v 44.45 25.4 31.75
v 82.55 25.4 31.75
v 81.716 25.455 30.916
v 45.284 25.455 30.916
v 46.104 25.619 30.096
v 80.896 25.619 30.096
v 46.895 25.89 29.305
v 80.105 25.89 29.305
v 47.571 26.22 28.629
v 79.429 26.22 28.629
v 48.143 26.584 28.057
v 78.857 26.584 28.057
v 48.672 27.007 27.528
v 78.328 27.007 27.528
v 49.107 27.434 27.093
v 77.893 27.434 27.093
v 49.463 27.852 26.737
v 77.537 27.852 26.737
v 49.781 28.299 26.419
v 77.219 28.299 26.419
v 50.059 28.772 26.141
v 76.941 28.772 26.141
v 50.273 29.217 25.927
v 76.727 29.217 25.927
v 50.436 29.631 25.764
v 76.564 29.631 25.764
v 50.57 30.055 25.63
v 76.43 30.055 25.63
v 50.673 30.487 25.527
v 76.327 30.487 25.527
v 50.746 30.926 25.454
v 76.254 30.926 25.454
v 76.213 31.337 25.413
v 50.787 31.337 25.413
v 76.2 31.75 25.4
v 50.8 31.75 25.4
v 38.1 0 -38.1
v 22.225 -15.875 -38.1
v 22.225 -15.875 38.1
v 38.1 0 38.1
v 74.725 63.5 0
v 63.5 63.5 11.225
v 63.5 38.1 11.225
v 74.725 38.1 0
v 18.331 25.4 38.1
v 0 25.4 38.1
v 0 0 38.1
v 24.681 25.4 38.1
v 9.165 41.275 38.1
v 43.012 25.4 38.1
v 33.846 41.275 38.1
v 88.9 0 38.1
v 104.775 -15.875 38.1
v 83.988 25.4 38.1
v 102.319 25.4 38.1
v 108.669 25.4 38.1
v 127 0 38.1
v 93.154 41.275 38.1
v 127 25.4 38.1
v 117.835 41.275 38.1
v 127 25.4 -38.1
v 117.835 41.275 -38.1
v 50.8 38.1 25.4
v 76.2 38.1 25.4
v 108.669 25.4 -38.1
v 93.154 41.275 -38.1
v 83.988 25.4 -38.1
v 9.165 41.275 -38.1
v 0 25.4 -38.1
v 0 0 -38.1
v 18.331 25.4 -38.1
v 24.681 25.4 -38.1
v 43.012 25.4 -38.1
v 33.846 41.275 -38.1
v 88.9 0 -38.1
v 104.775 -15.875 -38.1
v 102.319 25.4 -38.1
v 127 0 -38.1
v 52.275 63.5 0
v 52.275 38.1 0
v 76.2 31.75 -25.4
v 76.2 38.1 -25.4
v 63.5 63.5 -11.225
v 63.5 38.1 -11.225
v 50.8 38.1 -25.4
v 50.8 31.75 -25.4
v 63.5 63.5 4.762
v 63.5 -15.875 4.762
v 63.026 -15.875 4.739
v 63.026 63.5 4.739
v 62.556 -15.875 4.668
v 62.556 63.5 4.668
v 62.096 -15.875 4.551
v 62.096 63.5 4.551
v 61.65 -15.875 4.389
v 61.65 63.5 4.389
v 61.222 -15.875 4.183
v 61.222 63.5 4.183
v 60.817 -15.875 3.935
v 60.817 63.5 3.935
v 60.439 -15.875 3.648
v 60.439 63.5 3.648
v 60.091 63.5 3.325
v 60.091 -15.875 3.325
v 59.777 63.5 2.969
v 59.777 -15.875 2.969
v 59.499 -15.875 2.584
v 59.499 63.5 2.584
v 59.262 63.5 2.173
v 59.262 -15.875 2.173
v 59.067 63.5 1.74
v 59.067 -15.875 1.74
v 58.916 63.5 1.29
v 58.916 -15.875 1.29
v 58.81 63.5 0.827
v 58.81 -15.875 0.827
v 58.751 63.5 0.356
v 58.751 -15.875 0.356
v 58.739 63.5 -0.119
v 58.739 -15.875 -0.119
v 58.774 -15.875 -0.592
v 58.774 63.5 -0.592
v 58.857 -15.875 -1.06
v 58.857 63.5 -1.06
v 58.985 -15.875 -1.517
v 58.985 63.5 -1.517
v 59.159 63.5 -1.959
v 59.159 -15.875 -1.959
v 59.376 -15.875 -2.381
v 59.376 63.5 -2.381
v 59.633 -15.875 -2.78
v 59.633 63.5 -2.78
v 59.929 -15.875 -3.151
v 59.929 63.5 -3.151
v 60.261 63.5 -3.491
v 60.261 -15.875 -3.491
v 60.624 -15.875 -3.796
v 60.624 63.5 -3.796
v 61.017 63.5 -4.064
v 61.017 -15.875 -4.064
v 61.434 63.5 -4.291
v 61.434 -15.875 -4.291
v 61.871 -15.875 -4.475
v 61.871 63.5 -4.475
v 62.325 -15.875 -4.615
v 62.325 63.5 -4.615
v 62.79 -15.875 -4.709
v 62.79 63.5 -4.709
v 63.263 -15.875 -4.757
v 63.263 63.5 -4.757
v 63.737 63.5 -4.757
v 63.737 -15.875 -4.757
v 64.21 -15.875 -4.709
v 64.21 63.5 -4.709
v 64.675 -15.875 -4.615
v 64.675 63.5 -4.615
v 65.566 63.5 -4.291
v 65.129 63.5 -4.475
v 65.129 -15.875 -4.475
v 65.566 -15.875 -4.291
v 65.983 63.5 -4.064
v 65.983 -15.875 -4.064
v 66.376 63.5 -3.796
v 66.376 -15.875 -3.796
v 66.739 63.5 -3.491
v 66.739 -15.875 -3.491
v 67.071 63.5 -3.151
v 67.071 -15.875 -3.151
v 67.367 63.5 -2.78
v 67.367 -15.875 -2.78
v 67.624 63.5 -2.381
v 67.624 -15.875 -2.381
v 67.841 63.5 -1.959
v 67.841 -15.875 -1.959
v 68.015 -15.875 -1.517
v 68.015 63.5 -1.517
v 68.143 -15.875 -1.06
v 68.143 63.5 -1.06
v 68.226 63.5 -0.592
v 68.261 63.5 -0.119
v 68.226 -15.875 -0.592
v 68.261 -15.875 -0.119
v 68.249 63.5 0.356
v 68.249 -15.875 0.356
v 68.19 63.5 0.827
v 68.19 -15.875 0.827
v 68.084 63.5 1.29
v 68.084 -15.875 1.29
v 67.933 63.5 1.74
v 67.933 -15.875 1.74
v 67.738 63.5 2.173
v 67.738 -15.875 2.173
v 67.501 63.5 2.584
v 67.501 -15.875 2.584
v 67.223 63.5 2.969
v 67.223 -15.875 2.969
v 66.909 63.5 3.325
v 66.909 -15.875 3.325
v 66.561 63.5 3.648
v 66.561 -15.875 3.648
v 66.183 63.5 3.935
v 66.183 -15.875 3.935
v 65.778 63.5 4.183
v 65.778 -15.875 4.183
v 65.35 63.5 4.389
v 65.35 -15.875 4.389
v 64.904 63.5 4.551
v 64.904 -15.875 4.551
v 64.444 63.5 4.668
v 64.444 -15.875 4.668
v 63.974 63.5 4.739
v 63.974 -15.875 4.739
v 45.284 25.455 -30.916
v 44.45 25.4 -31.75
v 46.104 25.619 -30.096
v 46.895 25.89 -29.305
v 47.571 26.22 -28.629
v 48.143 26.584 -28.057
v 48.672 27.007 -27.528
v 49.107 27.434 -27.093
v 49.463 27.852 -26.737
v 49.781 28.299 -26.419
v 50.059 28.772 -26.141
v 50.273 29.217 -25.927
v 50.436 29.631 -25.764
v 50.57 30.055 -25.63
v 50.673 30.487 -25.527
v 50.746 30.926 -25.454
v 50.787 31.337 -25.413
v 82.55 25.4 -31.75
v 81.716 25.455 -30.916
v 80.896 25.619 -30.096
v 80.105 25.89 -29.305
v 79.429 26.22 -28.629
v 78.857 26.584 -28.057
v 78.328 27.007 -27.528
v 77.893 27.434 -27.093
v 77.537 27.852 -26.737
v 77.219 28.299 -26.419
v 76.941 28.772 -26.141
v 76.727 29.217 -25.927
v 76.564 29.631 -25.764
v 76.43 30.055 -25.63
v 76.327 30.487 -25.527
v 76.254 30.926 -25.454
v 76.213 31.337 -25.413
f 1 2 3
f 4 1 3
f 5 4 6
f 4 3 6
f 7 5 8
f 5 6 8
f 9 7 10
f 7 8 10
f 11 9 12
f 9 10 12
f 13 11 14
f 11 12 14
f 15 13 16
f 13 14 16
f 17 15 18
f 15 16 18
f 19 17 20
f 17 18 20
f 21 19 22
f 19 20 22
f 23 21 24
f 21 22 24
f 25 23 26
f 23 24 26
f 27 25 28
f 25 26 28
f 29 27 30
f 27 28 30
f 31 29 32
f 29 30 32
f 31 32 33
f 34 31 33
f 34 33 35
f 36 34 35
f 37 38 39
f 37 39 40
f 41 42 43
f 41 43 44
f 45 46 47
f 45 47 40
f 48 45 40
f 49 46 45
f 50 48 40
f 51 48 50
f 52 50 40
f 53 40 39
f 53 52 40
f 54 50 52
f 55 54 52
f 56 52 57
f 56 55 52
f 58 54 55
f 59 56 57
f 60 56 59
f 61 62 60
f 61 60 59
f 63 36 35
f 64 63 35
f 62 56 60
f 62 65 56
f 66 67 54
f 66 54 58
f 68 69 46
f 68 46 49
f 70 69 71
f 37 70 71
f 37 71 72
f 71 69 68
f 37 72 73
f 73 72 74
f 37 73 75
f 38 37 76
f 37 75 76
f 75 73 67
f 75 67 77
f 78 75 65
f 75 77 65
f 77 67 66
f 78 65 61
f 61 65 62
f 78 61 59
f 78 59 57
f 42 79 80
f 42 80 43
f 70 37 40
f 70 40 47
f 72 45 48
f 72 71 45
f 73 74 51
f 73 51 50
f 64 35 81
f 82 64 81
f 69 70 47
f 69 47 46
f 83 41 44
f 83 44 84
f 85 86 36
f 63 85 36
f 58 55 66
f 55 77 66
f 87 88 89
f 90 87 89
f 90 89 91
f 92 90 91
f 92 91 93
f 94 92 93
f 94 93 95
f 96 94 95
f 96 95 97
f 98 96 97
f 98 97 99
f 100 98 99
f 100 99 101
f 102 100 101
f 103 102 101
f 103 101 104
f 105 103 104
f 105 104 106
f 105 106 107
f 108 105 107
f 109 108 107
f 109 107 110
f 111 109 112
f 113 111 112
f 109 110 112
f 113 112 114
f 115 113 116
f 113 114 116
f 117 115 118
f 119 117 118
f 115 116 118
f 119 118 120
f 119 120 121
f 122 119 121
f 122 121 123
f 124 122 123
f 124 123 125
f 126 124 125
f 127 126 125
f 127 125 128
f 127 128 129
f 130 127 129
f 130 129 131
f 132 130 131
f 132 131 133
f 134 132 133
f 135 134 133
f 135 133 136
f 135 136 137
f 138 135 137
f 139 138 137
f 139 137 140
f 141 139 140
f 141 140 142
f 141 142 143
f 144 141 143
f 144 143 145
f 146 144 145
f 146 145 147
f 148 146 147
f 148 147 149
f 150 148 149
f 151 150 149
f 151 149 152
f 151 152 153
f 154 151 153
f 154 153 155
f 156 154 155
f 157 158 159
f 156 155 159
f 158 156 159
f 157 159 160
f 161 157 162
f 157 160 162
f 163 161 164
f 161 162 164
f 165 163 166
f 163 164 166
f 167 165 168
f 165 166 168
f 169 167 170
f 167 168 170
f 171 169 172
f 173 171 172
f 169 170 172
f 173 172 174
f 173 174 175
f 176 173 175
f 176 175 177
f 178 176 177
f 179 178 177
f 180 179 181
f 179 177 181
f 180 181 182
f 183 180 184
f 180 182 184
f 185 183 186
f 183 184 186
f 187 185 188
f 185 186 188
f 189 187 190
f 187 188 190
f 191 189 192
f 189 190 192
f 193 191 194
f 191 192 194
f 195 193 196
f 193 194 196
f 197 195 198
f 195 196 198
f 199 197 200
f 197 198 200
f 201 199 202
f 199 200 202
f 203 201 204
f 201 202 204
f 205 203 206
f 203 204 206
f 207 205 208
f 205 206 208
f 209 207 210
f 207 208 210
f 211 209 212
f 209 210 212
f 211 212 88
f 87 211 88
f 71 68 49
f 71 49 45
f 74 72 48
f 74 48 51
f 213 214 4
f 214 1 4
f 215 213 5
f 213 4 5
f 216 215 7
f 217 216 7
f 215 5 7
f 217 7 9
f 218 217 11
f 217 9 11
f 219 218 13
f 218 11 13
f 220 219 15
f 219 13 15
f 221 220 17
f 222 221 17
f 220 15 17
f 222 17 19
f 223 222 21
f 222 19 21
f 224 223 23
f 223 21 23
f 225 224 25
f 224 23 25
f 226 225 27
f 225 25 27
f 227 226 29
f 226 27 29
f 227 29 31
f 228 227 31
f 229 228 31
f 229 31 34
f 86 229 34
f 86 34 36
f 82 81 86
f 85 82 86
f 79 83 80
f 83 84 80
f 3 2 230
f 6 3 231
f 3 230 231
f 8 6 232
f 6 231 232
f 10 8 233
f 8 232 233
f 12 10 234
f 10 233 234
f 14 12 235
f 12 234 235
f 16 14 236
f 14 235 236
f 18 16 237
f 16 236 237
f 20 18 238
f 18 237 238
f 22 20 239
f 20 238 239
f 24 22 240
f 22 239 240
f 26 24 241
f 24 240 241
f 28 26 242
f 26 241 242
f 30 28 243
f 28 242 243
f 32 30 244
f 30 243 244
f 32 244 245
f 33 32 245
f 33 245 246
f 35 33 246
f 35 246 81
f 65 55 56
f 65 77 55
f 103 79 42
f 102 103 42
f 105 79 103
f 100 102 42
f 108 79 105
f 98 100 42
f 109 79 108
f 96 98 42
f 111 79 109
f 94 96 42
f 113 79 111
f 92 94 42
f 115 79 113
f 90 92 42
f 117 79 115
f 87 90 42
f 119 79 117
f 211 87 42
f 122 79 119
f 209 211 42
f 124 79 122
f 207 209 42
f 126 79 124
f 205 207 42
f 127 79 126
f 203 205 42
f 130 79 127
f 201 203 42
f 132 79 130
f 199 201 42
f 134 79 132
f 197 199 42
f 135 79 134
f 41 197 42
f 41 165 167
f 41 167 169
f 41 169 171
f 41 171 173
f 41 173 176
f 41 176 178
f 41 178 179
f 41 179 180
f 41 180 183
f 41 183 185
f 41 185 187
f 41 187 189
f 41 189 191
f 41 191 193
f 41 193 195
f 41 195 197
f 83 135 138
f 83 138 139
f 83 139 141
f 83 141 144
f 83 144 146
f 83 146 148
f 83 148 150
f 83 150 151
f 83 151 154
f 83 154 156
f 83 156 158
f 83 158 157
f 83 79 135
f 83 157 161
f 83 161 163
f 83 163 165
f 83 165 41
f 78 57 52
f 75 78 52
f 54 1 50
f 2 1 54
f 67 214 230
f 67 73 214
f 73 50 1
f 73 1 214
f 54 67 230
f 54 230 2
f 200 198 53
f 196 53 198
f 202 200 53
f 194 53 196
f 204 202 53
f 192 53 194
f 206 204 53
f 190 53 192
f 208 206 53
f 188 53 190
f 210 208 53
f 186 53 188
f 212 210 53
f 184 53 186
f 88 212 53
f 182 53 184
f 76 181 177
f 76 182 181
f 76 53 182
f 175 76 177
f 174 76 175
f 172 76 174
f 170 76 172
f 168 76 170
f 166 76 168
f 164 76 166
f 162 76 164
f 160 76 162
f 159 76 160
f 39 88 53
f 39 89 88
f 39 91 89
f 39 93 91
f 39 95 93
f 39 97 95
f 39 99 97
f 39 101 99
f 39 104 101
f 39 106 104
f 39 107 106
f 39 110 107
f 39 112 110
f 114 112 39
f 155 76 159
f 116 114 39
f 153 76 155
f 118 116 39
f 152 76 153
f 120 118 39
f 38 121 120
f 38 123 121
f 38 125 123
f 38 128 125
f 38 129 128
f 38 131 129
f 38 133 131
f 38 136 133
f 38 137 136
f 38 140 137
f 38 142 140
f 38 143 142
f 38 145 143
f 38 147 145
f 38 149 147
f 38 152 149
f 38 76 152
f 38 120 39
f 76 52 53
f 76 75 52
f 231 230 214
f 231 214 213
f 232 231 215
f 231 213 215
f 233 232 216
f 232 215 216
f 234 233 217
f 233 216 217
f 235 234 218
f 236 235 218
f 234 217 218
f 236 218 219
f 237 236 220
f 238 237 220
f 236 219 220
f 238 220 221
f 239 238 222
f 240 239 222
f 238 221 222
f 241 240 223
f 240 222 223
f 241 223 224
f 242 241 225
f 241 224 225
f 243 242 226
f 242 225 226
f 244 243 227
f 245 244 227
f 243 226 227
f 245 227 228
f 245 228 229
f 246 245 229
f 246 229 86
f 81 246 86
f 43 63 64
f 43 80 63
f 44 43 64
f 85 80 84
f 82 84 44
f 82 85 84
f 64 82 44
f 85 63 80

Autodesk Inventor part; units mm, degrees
ref_plane "YZ Plane" through (0, 0, 0) normal (1, 0, 0) x (0, 1, 0)
ref_plane "XZ Plane" through (0, 0, 0) normal (0, 1, 0) x (-1, 0, 0)
ref_plane "XY Plane" through (0, 0, 0) normal (0, 0, 1) x (1, 0, 0)
sketch "Sketch1" plane through (0, 0, 0) normal (0, 0, 1) x (1, 0, 0)
  line L0 (0, 0) -> (0, 25.4)
  line L1 (0, 25.4) -> (9.1654, 41.275)
  line L2 (9.1654, 41.275) -> (18.3309, 25.4)
  line L3 (18.3309, 25.4) -> (24.6809, 25.4)
  line L4 (24.6809, 25.4) -> (33.8463, 41.275)
  line L5 (33.8463, 41.275) -> (43.0117, 25.4)
  line L6 (43.0117, 25.4) -> (83.9883, 25.4)
  line L7 (102.3191, 25.4) -> (108.6691, 25.4)
  line L8 (108.6691, 25.4) -> (117.8346, 41.275)
  line L9 (117.8346, 41.275) -> (127, 25.4)
  line L10 (127, 25.4) -> (127, 0)
  line L11 (127, 0) -> (88.9, 0)
  line L12 (88.9, 0) -> (104.775, -15.875)
  line L13 (104.775, -15.875) -> (22.225, -15.875)
  line L14 (22.225, -15.875) -> (38.1, 0)
  line L15 (38.1, 0) -> (0, 0)
  line L16 (9.1654, 41.275) -> (117.8346, 41.275) construction
  line L17 (102.3191, 25.4) -> (93.1537, 41.275)
  line L18 (83.9883, 25.4) -> (93.1537, 41.275)
  dimension "d0" = 45
  dimension "d1" = 45
  dimension "d2" = 127
  dimension "d3" = 60
  dimension "d4" = 6.35
  dimension "d5" = 25.4
  dimension "d6" = 25.4
  dimension "d7" = 38.1
  dimension "d8" = 15.875
  dimension "d9" = 6.35
  dimension "d10" = 60
  dimension "d12" = 60
  dimension "d13" = 25.4
  dimension "d14" = 25.4
  dimension "d15" = 25.4
  dimension "d16" = 15.875
  dimension "d17" = 60
extrude "MAIN BODY" add sketch "Sketch1" along normal mid plane 76.2
sketch "Sketch2" plane through (43.0117, 25.4, 38.1) normal (0, 1, 0) x (1, 0, 0)
  line L0 (7.7883, 12.7) -> (33.1883, 12.7)
  line L1 (33.1883, 12.7) -> (33.1883, 63.5)
  line L2 (33.1883, 63.5) -> (7.7883, 63.5)
  line L3 (7.7883, 63.5) -> (7.7883, 12.7)
  line L4 (40.9765, 0) -> (0, 0) projected
  line L5 (0, 76.2) -> (40.9765, 76.2) projected
  line L6 (40.9765, 76.2) -> (40.9765, 0) projected
  line L7 (0, 76.2) -> (0, 0) projected
  point P0 (-43.0117, 38.1)
  point P1 (20.4883, 12.7)
  dimension "d25" = 50.8
  dimension "d26" = 25.4
  dimension "d27" = 12.7
  dimension "d28" = 40.9765
  dimension "d29" = 7.7883
  dimension "d30" = 76.2
extrude "LARGE BOSS" add sketch "Sketch2" along normal blind 12.7 contours L3 L2 L1 L0
sketch "Sketch3" plane through (43.0117, 38.1, 38.1) normal (0, 1, 0) x (1, 0, 0)
  line L0 (7.7883, 12.7) -> (7.7883, 63.5) projected
  line L1 (9.2629, 38.1) -> (20.4883, 26.8747)
  line L2 (20.4883, 26.8747) -> (31.7136, 38.1)
  line L3 (31.7136, 38.1) -> (20.4883, 49.3253)
  line L4 (20.4883, 49.3253) -> (9.2629, 38.1)
  line L5 (33.1883, 12.7) -> (33.1883, 63.5) projected
  line L6 (7.7883, 63.5) -> (33.1883, 63.5) projected
  line L7 (20.4883, 63.5) -> (20.4883, 12.7) construction
  line L8 (7.7883, 12.7) -> (33.1883, 12.7) projected
  line L9 (7.7883, 38.1) -> (33.1883, 38.1) construction
  point P0 (-43.0117, 38.1)
  dimension "d34" = 15.875
  dimension "d35" = 15.875
  dimension "d36" = 45
extrude "TALL BOSS" add sketch "Sketch3" along normal blind 25.4 contours L4 L3 L2 L1
sketch "Sketch4" plane through (43.0117, 63.5, 38.1) normal (0, 1, 0) x (1, 0, 0)
  line L0 (20.4883, 49.3253) -> (9.2629, 38.1) projected
  line L1 (20.4883, 26.8747) -> (31.7136, 38.1) projected
  line L2 (9.2629, 38.1) -> (31.7136, 38.1)
  line L3 (31.7136, 38.1) -> (20.4883, 49.3253) projected
  line L4 (20.4883, 49.3253) -> (20.4883, 26.8747)
  point P0 (-43.0117, 38.1)
  point P1 (20.4883, 38.1)
hole "THROUGH HOLE" at (63.5, 63.5, 0) direction (0, -1, 0) diameter 9.525 end through all
fillet "LARGE BOSS FILLET" radius 6.35 4 edges at (76.2, 25.4, 0) (63.5, 25.4, -25.4) (50.8, 25.4, 0) (63.5, 25.4, 25.4)
equation "\"d1\" = d0"
equation "\"d6\" = d5"
equation "\"d9\" = d4"
equation "\"d10\" = d3"
equation "\"d12\" = d11"
equation "\"d13\" = d6"
equation "\"d14\" = d13"
equation "\"d27\" = -0.5 * d25 + 0.5 * d30"
equation "\"d29\" = -0.5 * d26 + 0.5 * d28"
equation "\"d11\" = d10"
properties part number "2020-10-BK" material "Gold"
